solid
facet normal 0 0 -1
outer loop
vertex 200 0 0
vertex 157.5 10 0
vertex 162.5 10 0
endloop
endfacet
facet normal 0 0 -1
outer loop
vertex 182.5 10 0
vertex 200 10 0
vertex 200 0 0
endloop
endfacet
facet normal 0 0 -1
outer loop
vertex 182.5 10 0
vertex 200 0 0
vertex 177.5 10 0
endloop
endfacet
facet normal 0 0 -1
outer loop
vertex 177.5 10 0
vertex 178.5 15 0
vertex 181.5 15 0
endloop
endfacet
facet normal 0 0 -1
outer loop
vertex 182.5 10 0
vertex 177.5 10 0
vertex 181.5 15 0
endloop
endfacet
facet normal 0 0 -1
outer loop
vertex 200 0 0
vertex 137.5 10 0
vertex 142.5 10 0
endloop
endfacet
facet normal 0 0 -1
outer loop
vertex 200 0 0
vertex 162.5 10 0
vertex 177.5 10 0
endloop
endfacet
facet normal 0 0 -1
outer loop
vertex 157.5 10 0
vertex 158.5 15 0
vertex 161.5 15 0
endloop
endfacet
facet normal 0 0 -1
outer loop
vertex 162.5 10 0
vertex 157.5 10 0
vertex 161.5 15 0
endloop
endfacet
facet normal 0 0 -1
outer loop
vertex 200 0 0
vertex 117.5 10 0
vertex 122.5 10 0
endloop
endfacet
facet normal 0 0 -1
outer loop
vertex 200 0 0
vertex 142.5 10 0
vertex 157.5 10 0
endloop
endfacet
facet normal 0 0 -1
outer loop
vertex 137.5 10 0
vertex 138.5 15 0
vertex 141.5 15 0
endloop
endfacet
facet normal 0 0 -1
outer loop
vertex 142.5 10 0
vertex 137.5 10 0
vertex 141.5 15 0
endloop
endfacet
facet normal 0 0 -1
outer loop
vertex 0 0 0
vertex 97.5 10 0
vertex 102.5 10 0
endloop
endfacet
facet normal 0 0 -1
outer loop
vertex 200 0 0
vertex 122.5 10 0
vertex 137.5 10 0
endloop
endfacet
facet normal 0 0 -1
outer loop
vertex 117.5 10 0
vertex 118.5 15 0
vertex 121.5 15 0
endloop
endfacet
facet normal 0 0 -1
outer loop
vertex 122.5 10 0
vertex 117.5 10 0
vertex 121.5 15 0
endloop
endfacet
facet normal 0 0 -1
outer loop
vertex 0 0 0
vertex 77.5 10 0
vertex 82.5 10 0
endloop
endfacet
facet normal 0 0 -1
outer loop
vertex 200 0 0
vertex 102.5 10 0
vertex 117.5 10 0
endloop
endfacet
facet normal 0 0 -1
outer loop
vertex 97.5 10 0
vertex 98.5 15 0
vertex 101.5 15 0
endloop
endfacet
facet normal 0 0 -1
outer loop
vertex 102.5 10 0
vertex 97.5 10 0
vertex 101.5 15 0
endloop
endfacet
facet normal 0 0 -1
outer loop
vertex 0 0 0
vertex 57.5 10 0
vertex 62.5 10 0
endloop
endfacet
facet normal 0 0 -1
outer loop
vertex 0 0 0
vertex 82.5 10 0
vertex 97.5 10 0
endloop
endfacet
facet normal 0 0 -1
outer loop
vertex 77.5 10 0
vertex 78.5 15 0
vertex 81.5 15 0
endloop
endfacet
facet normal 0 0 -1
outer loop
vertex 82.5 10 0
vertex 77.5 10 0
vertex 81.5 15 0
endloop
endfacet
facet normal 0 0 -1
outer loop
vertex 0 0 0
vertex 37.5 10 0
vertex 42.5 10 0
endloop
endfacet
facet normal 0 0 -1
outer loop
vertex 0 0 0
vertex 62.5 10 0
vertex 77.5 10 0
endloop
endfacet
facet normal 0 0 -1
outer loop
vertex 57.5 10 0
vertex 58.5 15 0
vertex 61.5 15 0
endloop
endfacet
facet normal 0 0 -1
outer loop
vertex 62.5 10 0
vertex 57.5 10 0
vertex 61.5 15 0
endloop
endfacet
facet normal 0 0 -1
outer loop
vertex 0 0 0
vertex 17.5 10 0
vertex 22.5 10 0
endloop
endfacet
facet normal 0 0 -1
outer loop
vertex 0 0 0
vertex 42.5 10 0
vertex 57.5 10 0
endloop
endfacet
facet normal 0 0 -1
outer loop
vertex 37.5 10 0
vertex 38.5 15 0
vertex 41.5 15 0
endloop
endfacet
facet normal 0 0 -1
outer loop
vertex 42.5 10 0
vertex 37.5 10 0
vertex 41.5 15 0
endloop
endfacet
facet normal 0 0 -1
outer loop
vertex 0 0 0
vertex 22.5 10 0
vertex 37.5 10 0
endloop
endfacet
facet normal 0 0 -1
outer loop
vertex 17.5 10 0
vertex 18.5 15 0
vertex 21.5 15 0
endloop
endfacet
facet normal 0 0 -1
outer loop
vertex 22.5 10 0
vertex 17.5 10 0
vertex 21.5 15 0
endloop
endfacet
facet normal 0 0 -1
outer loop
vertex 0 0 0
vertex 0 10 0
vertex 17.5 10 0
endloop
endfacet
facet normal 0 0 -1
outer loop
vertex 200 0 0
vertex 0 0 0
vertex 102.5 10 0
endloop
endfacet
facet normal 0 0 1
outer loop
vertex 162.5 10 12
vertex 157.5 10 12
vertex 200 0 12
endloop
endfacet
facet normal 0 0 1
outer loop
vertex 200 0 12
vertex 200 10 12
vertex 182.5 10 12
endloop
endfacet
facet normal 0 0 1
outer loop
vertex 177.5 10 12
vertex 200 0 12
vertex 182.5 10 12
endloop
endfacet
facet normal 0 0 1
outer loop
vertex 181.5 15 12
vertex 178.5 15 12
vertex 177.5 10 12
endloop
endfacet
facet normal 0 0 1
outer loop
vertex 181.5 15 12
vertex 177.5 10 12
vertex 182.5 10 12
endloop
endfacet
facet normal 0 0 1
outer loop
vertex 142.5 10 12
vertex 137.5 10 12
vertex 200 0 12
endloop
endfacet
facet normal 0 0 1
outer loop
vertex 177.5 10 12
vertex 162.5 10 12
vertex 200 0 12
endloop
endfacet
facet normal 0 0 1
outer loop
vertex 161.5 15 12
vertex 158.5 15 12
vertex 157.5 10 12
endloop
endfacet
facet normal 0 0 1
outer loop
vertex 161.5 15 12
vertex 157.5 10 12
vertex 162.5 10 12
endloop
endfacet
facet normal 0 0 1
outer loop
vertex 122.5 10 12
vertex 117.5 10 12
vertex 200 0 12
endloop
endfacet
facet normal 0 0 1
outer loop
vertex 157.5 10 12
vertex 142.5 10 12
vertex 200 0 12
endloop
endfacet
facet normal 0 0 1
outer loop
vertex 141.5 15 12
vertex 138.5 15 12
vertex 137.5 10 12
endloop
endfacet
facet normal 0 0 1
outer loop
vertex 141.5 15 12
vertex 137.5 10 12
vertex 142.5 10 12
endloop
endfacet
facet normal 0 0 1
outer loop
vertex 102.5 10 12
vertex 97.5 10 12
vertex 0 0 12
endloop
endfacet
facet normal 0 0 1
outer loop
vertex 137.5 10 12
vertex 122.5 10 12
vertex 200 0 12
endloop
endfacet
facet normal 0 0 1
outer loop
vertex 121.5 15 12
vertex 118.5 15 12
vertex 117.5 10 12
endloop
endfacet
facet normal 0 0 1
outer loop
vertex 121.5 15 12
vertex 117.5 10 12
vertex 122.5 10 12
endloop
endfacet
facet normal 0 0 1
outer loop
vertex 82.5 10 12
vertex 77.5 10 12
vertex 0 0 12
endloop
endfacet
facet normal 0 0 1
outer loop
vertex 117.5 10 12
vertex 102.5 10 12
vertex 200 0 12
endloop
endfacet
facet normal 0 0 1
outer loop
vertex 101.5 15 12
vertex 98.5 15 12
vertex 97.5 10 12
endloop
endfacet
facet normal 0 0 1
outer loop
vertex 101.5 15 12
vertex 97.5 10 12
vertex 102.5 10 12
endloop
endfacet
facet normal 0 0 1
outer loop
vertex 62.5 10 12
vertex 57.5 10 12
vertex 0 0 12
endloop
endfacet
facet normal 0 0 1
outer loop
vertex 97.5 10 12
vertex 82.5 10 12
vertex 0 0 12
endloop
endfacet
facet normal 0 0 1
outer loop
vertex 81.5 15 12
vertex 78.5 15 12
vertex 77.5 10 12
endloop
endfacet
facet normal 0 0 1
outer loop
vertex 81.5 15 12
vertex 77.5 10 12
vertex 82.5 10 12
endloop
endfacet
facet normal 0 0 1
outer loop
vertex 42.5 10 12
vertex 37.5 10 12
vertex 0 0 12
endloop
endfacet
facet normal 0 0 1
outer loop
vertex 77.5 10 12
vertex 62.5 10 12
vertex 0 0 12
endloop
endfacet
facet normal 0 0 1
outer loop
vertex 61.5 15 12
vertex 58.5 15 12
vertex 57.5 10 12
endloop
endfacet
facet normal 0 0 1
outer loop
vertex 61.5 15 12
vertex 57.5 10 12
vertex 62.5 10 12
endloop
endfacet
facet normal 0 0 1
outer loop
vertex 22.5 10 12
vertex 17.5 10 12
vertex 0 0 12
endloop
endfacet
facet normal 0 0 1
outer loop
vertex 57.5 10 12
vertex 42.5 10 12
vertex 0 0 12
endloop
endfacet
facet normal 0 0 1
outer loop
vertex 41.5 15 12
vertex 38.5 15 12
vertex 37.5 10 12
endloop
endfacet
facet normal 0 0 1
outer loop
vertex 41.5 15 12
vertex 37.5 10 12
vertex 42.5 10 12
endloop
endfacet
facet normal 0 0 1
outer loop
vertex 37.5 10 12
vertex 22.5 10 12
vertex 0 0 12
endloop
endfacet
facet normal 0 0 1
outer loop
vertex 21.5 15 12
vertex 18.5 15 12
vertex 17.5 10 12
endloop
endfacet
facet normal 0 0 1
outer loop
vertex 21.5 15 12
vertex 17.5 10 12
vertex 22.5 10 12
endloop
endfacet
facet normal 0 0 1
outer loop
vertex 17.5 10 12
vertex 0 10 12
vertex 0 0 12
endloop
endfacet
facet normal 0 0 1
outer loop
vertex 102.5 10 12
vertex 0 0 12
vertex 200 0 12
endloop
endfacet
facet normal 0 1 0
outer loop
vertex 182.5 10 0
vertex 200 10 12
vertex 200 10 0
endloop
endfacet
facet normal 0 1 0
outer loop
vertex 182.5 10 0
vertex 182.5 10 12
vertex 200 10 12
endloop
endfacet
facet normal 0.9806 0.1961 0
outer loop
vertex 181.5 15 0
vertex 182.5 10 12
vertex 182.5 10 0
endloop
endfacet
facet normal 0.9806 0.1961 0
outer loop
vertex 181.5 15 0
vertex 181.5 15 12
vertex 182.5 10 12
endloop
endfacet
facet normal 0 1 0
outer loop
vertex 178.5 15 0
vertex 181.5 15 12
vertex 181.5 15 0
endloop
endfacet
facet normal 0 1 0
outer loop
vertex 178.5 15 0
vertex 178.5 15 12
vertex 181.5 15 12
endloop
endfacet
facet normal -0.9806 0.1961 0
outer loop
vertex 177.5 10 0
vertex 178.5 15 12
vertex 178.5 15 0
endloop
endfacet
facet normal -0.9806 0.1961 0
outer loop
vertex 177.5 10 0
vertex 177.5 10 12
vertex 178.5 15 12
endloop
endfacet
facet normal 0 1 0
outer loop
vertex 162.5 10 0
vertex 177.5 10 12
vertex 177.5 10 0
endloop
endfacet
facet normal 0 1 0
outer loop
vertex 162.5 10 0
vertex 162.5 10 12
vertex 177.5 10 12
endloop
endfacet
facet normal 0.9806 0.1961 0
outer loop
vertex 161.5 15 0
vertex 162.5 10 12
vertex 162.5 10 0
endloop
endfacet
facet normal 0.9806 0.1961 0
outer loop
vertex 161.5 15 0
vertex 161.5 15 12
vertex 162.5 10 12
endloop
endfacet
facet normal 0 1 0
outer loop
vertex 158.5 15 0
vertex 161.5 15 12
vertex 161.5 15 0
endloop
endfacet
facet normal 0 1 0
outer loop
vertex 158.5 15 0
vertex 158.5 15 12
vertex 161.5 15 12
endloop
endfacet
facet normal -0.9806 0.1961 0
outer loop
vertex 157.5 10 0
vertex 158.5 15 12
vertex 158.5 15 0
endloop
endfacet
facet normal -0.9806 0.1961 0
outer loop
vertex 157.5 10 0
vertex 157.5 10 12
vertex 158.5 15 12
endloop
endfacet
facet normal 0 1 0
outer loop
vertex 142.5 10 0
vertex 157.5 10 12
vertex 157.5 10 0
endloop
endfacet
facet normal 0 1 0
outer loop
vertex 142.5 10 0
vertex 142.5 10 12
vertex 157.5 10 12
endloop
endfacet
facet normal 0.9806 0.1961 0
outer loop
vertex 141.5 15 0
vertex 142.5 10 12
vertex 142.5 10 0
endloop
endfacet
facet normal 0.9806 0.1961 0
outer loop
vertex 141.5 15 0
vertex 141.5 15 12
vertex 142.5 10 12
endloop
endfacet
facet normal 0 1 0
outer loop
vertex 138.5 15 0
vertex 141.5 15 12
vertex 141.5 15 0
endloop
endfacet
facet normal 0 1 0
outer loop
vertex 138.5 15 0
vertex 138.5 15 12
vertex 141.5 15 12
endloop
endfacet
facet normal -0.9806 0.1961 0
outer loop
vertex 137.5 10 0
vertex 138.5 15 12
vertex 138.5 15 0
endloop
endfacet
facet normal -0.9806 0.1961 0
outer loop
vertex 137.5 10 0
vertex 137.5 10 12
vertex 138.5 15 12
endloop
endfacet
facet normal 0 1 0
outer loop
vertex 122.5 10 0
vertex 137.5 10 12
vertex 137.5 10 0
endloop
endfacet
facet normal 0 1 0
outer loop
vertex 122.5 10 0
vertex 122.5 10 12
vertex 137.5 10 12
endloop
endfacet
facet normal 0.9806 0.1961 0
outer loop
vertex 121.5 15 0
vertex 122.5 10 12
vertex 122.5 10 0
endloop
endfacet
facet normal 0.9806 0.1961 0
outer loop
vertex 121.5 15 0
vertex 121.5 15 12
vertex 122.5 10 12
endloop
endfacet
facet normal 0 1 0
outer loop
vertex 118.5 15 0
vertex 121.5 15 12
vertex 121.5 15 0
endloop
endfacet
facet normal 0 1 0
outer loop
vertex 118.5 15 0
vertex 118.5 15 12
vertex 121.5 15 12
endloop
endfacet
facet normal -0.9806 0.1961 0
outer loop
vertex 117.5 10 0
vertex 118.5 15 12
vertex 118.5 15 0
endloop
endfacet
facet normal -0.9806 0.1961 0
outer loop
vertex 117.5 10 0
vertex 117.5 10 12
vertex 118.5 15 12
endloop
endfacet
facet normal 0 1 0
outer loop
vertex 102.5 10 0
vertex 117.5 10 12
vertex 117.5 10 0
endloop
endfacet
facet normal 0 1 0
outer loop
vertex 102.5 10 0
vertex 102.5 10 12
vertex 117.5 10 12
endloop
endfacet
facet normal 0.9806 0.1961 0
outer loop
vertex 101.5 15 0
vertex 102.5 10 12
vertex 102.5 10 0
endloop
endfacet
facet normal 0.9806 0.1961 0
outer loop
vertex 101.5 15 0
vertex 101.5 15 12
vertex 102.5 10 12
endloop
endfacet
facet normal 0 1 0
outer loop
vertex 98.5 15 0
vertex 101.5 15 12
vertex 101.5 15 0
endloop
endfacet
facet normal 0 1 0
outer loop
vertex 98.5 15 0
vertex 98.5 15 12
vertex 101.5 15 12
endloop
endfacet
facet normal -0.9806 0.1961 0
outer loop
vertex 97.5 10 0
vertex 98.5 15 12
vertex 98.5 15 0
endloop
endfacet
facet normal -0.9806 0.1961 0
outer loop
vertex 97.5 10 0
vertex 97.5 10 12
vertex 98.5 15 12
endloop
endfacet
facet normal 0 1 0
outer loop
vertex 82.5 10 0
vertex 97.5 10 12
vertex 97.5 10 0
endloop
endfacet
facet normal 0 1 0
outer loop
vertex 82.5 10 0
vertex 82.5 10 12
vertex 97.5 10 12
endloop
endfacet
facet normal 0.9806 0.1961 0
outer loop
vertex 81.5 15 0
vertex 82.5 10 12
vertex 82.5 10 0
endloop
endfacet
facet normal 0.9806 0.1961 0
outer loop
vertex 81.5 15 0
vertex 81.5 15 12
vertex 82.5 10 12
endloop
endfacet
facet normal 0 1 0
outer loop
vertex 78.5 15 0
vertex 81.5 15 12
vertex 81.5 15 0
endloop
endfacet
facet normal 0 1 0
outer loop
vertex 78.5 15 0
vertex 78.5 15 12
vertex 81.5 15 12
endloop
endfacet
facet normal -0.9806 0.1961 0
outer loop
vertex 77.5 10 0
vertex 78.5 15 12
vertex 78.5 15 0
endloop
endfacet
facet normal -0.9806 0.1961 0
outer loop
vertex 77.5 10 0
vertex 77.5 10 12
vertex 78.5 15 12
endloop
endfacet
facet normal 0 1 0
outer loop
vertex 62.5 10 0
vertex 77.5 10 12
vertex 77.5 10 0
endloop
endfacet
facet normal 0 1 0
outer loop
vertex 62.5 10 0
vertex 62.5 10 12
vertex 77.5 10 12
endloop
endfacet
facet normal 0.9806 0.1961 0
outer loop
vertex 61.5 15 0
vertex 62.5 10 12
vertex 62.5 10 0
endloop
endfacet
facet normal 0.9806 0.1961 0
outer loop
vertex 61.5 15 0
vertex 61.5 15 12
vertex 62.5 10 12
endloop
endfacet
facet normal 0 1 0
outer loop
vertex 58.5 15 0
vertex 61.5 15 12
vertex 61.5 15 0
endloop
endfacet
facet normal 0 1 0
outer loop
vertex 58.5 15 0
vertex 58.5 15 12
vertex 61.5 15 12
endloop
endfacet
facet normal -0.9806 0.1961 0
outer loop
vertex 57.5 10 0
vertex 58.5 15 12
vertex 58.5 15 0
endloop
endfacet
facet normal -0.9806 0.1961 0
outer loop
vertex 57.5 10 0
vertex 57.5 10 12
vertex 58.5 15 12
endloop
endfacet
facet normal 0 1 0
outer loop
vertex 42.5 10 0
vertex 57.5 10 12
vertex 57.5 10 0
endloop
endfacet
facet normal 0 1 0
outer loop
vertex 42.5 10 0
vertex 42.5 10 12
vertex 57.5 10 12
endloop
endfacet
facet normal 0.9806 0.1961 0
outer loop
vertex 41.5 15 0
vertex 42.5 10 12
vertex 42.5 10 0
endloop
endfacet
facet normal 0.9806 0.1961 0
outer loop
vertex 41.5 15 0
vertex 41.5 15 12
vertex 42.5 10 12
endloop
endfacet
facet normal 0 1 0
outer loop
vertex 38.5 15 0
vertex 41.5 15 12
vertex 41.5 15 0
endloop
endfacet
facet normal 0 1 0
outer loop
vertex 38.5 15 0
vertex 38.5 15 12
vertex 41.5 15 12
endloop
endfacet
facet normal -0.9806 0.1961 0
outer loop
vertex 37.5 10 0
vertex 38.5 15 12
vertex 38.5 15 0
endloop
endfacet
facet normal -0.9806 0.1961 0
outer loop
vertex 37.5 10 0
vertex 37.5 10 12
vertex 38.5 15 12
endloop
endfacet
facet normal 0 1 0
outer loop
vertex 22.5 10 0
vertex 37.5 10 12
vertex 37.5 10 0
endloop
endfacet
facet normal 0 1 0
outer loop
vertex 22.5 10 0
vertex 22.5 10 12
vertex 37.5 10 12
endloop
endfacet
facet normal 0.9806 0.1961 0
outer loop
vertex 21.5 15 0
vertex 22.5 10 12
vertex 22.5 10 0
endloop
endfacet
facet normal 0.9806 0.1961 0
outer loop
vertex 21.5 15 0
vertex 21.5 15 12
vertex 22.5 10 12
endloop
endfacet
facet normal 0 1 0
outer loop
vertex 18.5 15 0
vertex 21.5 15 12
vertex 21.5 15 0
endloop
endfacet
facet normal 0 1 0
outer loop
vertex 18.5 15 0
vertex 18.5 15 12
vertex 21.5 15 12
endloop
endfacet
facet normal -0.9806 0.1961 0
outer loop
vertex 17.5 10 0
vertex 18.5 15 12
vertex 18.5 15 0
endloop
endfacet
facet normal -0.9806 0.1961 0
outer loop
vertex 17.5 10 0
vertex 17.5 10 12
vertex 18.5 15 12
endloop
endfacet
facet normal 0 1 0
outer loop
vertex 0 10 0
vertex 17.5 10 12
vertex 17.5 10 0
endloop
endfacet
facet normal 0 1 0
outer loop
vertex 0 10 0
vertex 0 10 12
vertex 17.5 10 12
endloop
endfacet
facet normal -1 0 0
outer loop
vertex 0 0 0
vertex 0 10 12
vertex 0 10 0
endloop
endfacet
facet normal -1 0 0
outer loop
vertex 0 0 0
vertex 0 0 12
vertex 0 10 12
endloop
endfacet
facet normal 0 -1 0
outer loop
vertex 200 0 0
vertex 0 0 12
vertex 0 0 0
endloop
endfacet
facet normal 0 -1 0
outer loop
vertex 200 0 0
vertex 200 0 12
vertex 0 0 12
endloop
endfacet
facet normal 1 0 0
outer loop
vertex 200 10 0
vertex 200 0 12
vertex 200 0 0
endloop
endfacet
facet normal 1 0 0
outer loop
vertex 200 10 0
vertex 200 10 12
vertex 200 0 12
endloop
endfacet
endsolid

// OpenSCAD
$fn = 32;

// ----------------------------------------------------------------------
// Gear rack: 9 teeth on a 200 mm bar, pitch 20 mm
// ----------------------------------------------------------------------

// --- parameters (mm) ---
profile_height = 12;      // extrusion height
profile_points = 40;      // points of the closed outline

profile = [[0, 0], [200, 0], [200, 10], [182.5, 10], [181.5, 15], [178.5, 15], [177.5, 10], [162.5, 10], [161.5, 15], [158.5, 15], [157.5, 10], [142.5, 10], [141.5, 15], [138.5, 15], [137.5, 10], [122.5, 10], [121.5, 15], [118.5, 15], [117.5, 10], [102.5, 10], [101.5, 15], [98.5, 15], [97.5, 10], [82.5, 10], [81.5, 15], [78.5, 15], [77.5, 10], [62.5, 10], [61.5, 15], [58.5, 15], [57.5, 10], [42.5, 10], [41.5, 15], [38.5, 15], [37.5, 10], [22.5, 10], [21.5, 15], [18.5, 15], [17.5, 10], [0, 10]];  // single closed polygon, 40 points, counter clockwise

// --- the one profile operation ---
linear_extrude(height = profile_height) polygon(points = profile);
